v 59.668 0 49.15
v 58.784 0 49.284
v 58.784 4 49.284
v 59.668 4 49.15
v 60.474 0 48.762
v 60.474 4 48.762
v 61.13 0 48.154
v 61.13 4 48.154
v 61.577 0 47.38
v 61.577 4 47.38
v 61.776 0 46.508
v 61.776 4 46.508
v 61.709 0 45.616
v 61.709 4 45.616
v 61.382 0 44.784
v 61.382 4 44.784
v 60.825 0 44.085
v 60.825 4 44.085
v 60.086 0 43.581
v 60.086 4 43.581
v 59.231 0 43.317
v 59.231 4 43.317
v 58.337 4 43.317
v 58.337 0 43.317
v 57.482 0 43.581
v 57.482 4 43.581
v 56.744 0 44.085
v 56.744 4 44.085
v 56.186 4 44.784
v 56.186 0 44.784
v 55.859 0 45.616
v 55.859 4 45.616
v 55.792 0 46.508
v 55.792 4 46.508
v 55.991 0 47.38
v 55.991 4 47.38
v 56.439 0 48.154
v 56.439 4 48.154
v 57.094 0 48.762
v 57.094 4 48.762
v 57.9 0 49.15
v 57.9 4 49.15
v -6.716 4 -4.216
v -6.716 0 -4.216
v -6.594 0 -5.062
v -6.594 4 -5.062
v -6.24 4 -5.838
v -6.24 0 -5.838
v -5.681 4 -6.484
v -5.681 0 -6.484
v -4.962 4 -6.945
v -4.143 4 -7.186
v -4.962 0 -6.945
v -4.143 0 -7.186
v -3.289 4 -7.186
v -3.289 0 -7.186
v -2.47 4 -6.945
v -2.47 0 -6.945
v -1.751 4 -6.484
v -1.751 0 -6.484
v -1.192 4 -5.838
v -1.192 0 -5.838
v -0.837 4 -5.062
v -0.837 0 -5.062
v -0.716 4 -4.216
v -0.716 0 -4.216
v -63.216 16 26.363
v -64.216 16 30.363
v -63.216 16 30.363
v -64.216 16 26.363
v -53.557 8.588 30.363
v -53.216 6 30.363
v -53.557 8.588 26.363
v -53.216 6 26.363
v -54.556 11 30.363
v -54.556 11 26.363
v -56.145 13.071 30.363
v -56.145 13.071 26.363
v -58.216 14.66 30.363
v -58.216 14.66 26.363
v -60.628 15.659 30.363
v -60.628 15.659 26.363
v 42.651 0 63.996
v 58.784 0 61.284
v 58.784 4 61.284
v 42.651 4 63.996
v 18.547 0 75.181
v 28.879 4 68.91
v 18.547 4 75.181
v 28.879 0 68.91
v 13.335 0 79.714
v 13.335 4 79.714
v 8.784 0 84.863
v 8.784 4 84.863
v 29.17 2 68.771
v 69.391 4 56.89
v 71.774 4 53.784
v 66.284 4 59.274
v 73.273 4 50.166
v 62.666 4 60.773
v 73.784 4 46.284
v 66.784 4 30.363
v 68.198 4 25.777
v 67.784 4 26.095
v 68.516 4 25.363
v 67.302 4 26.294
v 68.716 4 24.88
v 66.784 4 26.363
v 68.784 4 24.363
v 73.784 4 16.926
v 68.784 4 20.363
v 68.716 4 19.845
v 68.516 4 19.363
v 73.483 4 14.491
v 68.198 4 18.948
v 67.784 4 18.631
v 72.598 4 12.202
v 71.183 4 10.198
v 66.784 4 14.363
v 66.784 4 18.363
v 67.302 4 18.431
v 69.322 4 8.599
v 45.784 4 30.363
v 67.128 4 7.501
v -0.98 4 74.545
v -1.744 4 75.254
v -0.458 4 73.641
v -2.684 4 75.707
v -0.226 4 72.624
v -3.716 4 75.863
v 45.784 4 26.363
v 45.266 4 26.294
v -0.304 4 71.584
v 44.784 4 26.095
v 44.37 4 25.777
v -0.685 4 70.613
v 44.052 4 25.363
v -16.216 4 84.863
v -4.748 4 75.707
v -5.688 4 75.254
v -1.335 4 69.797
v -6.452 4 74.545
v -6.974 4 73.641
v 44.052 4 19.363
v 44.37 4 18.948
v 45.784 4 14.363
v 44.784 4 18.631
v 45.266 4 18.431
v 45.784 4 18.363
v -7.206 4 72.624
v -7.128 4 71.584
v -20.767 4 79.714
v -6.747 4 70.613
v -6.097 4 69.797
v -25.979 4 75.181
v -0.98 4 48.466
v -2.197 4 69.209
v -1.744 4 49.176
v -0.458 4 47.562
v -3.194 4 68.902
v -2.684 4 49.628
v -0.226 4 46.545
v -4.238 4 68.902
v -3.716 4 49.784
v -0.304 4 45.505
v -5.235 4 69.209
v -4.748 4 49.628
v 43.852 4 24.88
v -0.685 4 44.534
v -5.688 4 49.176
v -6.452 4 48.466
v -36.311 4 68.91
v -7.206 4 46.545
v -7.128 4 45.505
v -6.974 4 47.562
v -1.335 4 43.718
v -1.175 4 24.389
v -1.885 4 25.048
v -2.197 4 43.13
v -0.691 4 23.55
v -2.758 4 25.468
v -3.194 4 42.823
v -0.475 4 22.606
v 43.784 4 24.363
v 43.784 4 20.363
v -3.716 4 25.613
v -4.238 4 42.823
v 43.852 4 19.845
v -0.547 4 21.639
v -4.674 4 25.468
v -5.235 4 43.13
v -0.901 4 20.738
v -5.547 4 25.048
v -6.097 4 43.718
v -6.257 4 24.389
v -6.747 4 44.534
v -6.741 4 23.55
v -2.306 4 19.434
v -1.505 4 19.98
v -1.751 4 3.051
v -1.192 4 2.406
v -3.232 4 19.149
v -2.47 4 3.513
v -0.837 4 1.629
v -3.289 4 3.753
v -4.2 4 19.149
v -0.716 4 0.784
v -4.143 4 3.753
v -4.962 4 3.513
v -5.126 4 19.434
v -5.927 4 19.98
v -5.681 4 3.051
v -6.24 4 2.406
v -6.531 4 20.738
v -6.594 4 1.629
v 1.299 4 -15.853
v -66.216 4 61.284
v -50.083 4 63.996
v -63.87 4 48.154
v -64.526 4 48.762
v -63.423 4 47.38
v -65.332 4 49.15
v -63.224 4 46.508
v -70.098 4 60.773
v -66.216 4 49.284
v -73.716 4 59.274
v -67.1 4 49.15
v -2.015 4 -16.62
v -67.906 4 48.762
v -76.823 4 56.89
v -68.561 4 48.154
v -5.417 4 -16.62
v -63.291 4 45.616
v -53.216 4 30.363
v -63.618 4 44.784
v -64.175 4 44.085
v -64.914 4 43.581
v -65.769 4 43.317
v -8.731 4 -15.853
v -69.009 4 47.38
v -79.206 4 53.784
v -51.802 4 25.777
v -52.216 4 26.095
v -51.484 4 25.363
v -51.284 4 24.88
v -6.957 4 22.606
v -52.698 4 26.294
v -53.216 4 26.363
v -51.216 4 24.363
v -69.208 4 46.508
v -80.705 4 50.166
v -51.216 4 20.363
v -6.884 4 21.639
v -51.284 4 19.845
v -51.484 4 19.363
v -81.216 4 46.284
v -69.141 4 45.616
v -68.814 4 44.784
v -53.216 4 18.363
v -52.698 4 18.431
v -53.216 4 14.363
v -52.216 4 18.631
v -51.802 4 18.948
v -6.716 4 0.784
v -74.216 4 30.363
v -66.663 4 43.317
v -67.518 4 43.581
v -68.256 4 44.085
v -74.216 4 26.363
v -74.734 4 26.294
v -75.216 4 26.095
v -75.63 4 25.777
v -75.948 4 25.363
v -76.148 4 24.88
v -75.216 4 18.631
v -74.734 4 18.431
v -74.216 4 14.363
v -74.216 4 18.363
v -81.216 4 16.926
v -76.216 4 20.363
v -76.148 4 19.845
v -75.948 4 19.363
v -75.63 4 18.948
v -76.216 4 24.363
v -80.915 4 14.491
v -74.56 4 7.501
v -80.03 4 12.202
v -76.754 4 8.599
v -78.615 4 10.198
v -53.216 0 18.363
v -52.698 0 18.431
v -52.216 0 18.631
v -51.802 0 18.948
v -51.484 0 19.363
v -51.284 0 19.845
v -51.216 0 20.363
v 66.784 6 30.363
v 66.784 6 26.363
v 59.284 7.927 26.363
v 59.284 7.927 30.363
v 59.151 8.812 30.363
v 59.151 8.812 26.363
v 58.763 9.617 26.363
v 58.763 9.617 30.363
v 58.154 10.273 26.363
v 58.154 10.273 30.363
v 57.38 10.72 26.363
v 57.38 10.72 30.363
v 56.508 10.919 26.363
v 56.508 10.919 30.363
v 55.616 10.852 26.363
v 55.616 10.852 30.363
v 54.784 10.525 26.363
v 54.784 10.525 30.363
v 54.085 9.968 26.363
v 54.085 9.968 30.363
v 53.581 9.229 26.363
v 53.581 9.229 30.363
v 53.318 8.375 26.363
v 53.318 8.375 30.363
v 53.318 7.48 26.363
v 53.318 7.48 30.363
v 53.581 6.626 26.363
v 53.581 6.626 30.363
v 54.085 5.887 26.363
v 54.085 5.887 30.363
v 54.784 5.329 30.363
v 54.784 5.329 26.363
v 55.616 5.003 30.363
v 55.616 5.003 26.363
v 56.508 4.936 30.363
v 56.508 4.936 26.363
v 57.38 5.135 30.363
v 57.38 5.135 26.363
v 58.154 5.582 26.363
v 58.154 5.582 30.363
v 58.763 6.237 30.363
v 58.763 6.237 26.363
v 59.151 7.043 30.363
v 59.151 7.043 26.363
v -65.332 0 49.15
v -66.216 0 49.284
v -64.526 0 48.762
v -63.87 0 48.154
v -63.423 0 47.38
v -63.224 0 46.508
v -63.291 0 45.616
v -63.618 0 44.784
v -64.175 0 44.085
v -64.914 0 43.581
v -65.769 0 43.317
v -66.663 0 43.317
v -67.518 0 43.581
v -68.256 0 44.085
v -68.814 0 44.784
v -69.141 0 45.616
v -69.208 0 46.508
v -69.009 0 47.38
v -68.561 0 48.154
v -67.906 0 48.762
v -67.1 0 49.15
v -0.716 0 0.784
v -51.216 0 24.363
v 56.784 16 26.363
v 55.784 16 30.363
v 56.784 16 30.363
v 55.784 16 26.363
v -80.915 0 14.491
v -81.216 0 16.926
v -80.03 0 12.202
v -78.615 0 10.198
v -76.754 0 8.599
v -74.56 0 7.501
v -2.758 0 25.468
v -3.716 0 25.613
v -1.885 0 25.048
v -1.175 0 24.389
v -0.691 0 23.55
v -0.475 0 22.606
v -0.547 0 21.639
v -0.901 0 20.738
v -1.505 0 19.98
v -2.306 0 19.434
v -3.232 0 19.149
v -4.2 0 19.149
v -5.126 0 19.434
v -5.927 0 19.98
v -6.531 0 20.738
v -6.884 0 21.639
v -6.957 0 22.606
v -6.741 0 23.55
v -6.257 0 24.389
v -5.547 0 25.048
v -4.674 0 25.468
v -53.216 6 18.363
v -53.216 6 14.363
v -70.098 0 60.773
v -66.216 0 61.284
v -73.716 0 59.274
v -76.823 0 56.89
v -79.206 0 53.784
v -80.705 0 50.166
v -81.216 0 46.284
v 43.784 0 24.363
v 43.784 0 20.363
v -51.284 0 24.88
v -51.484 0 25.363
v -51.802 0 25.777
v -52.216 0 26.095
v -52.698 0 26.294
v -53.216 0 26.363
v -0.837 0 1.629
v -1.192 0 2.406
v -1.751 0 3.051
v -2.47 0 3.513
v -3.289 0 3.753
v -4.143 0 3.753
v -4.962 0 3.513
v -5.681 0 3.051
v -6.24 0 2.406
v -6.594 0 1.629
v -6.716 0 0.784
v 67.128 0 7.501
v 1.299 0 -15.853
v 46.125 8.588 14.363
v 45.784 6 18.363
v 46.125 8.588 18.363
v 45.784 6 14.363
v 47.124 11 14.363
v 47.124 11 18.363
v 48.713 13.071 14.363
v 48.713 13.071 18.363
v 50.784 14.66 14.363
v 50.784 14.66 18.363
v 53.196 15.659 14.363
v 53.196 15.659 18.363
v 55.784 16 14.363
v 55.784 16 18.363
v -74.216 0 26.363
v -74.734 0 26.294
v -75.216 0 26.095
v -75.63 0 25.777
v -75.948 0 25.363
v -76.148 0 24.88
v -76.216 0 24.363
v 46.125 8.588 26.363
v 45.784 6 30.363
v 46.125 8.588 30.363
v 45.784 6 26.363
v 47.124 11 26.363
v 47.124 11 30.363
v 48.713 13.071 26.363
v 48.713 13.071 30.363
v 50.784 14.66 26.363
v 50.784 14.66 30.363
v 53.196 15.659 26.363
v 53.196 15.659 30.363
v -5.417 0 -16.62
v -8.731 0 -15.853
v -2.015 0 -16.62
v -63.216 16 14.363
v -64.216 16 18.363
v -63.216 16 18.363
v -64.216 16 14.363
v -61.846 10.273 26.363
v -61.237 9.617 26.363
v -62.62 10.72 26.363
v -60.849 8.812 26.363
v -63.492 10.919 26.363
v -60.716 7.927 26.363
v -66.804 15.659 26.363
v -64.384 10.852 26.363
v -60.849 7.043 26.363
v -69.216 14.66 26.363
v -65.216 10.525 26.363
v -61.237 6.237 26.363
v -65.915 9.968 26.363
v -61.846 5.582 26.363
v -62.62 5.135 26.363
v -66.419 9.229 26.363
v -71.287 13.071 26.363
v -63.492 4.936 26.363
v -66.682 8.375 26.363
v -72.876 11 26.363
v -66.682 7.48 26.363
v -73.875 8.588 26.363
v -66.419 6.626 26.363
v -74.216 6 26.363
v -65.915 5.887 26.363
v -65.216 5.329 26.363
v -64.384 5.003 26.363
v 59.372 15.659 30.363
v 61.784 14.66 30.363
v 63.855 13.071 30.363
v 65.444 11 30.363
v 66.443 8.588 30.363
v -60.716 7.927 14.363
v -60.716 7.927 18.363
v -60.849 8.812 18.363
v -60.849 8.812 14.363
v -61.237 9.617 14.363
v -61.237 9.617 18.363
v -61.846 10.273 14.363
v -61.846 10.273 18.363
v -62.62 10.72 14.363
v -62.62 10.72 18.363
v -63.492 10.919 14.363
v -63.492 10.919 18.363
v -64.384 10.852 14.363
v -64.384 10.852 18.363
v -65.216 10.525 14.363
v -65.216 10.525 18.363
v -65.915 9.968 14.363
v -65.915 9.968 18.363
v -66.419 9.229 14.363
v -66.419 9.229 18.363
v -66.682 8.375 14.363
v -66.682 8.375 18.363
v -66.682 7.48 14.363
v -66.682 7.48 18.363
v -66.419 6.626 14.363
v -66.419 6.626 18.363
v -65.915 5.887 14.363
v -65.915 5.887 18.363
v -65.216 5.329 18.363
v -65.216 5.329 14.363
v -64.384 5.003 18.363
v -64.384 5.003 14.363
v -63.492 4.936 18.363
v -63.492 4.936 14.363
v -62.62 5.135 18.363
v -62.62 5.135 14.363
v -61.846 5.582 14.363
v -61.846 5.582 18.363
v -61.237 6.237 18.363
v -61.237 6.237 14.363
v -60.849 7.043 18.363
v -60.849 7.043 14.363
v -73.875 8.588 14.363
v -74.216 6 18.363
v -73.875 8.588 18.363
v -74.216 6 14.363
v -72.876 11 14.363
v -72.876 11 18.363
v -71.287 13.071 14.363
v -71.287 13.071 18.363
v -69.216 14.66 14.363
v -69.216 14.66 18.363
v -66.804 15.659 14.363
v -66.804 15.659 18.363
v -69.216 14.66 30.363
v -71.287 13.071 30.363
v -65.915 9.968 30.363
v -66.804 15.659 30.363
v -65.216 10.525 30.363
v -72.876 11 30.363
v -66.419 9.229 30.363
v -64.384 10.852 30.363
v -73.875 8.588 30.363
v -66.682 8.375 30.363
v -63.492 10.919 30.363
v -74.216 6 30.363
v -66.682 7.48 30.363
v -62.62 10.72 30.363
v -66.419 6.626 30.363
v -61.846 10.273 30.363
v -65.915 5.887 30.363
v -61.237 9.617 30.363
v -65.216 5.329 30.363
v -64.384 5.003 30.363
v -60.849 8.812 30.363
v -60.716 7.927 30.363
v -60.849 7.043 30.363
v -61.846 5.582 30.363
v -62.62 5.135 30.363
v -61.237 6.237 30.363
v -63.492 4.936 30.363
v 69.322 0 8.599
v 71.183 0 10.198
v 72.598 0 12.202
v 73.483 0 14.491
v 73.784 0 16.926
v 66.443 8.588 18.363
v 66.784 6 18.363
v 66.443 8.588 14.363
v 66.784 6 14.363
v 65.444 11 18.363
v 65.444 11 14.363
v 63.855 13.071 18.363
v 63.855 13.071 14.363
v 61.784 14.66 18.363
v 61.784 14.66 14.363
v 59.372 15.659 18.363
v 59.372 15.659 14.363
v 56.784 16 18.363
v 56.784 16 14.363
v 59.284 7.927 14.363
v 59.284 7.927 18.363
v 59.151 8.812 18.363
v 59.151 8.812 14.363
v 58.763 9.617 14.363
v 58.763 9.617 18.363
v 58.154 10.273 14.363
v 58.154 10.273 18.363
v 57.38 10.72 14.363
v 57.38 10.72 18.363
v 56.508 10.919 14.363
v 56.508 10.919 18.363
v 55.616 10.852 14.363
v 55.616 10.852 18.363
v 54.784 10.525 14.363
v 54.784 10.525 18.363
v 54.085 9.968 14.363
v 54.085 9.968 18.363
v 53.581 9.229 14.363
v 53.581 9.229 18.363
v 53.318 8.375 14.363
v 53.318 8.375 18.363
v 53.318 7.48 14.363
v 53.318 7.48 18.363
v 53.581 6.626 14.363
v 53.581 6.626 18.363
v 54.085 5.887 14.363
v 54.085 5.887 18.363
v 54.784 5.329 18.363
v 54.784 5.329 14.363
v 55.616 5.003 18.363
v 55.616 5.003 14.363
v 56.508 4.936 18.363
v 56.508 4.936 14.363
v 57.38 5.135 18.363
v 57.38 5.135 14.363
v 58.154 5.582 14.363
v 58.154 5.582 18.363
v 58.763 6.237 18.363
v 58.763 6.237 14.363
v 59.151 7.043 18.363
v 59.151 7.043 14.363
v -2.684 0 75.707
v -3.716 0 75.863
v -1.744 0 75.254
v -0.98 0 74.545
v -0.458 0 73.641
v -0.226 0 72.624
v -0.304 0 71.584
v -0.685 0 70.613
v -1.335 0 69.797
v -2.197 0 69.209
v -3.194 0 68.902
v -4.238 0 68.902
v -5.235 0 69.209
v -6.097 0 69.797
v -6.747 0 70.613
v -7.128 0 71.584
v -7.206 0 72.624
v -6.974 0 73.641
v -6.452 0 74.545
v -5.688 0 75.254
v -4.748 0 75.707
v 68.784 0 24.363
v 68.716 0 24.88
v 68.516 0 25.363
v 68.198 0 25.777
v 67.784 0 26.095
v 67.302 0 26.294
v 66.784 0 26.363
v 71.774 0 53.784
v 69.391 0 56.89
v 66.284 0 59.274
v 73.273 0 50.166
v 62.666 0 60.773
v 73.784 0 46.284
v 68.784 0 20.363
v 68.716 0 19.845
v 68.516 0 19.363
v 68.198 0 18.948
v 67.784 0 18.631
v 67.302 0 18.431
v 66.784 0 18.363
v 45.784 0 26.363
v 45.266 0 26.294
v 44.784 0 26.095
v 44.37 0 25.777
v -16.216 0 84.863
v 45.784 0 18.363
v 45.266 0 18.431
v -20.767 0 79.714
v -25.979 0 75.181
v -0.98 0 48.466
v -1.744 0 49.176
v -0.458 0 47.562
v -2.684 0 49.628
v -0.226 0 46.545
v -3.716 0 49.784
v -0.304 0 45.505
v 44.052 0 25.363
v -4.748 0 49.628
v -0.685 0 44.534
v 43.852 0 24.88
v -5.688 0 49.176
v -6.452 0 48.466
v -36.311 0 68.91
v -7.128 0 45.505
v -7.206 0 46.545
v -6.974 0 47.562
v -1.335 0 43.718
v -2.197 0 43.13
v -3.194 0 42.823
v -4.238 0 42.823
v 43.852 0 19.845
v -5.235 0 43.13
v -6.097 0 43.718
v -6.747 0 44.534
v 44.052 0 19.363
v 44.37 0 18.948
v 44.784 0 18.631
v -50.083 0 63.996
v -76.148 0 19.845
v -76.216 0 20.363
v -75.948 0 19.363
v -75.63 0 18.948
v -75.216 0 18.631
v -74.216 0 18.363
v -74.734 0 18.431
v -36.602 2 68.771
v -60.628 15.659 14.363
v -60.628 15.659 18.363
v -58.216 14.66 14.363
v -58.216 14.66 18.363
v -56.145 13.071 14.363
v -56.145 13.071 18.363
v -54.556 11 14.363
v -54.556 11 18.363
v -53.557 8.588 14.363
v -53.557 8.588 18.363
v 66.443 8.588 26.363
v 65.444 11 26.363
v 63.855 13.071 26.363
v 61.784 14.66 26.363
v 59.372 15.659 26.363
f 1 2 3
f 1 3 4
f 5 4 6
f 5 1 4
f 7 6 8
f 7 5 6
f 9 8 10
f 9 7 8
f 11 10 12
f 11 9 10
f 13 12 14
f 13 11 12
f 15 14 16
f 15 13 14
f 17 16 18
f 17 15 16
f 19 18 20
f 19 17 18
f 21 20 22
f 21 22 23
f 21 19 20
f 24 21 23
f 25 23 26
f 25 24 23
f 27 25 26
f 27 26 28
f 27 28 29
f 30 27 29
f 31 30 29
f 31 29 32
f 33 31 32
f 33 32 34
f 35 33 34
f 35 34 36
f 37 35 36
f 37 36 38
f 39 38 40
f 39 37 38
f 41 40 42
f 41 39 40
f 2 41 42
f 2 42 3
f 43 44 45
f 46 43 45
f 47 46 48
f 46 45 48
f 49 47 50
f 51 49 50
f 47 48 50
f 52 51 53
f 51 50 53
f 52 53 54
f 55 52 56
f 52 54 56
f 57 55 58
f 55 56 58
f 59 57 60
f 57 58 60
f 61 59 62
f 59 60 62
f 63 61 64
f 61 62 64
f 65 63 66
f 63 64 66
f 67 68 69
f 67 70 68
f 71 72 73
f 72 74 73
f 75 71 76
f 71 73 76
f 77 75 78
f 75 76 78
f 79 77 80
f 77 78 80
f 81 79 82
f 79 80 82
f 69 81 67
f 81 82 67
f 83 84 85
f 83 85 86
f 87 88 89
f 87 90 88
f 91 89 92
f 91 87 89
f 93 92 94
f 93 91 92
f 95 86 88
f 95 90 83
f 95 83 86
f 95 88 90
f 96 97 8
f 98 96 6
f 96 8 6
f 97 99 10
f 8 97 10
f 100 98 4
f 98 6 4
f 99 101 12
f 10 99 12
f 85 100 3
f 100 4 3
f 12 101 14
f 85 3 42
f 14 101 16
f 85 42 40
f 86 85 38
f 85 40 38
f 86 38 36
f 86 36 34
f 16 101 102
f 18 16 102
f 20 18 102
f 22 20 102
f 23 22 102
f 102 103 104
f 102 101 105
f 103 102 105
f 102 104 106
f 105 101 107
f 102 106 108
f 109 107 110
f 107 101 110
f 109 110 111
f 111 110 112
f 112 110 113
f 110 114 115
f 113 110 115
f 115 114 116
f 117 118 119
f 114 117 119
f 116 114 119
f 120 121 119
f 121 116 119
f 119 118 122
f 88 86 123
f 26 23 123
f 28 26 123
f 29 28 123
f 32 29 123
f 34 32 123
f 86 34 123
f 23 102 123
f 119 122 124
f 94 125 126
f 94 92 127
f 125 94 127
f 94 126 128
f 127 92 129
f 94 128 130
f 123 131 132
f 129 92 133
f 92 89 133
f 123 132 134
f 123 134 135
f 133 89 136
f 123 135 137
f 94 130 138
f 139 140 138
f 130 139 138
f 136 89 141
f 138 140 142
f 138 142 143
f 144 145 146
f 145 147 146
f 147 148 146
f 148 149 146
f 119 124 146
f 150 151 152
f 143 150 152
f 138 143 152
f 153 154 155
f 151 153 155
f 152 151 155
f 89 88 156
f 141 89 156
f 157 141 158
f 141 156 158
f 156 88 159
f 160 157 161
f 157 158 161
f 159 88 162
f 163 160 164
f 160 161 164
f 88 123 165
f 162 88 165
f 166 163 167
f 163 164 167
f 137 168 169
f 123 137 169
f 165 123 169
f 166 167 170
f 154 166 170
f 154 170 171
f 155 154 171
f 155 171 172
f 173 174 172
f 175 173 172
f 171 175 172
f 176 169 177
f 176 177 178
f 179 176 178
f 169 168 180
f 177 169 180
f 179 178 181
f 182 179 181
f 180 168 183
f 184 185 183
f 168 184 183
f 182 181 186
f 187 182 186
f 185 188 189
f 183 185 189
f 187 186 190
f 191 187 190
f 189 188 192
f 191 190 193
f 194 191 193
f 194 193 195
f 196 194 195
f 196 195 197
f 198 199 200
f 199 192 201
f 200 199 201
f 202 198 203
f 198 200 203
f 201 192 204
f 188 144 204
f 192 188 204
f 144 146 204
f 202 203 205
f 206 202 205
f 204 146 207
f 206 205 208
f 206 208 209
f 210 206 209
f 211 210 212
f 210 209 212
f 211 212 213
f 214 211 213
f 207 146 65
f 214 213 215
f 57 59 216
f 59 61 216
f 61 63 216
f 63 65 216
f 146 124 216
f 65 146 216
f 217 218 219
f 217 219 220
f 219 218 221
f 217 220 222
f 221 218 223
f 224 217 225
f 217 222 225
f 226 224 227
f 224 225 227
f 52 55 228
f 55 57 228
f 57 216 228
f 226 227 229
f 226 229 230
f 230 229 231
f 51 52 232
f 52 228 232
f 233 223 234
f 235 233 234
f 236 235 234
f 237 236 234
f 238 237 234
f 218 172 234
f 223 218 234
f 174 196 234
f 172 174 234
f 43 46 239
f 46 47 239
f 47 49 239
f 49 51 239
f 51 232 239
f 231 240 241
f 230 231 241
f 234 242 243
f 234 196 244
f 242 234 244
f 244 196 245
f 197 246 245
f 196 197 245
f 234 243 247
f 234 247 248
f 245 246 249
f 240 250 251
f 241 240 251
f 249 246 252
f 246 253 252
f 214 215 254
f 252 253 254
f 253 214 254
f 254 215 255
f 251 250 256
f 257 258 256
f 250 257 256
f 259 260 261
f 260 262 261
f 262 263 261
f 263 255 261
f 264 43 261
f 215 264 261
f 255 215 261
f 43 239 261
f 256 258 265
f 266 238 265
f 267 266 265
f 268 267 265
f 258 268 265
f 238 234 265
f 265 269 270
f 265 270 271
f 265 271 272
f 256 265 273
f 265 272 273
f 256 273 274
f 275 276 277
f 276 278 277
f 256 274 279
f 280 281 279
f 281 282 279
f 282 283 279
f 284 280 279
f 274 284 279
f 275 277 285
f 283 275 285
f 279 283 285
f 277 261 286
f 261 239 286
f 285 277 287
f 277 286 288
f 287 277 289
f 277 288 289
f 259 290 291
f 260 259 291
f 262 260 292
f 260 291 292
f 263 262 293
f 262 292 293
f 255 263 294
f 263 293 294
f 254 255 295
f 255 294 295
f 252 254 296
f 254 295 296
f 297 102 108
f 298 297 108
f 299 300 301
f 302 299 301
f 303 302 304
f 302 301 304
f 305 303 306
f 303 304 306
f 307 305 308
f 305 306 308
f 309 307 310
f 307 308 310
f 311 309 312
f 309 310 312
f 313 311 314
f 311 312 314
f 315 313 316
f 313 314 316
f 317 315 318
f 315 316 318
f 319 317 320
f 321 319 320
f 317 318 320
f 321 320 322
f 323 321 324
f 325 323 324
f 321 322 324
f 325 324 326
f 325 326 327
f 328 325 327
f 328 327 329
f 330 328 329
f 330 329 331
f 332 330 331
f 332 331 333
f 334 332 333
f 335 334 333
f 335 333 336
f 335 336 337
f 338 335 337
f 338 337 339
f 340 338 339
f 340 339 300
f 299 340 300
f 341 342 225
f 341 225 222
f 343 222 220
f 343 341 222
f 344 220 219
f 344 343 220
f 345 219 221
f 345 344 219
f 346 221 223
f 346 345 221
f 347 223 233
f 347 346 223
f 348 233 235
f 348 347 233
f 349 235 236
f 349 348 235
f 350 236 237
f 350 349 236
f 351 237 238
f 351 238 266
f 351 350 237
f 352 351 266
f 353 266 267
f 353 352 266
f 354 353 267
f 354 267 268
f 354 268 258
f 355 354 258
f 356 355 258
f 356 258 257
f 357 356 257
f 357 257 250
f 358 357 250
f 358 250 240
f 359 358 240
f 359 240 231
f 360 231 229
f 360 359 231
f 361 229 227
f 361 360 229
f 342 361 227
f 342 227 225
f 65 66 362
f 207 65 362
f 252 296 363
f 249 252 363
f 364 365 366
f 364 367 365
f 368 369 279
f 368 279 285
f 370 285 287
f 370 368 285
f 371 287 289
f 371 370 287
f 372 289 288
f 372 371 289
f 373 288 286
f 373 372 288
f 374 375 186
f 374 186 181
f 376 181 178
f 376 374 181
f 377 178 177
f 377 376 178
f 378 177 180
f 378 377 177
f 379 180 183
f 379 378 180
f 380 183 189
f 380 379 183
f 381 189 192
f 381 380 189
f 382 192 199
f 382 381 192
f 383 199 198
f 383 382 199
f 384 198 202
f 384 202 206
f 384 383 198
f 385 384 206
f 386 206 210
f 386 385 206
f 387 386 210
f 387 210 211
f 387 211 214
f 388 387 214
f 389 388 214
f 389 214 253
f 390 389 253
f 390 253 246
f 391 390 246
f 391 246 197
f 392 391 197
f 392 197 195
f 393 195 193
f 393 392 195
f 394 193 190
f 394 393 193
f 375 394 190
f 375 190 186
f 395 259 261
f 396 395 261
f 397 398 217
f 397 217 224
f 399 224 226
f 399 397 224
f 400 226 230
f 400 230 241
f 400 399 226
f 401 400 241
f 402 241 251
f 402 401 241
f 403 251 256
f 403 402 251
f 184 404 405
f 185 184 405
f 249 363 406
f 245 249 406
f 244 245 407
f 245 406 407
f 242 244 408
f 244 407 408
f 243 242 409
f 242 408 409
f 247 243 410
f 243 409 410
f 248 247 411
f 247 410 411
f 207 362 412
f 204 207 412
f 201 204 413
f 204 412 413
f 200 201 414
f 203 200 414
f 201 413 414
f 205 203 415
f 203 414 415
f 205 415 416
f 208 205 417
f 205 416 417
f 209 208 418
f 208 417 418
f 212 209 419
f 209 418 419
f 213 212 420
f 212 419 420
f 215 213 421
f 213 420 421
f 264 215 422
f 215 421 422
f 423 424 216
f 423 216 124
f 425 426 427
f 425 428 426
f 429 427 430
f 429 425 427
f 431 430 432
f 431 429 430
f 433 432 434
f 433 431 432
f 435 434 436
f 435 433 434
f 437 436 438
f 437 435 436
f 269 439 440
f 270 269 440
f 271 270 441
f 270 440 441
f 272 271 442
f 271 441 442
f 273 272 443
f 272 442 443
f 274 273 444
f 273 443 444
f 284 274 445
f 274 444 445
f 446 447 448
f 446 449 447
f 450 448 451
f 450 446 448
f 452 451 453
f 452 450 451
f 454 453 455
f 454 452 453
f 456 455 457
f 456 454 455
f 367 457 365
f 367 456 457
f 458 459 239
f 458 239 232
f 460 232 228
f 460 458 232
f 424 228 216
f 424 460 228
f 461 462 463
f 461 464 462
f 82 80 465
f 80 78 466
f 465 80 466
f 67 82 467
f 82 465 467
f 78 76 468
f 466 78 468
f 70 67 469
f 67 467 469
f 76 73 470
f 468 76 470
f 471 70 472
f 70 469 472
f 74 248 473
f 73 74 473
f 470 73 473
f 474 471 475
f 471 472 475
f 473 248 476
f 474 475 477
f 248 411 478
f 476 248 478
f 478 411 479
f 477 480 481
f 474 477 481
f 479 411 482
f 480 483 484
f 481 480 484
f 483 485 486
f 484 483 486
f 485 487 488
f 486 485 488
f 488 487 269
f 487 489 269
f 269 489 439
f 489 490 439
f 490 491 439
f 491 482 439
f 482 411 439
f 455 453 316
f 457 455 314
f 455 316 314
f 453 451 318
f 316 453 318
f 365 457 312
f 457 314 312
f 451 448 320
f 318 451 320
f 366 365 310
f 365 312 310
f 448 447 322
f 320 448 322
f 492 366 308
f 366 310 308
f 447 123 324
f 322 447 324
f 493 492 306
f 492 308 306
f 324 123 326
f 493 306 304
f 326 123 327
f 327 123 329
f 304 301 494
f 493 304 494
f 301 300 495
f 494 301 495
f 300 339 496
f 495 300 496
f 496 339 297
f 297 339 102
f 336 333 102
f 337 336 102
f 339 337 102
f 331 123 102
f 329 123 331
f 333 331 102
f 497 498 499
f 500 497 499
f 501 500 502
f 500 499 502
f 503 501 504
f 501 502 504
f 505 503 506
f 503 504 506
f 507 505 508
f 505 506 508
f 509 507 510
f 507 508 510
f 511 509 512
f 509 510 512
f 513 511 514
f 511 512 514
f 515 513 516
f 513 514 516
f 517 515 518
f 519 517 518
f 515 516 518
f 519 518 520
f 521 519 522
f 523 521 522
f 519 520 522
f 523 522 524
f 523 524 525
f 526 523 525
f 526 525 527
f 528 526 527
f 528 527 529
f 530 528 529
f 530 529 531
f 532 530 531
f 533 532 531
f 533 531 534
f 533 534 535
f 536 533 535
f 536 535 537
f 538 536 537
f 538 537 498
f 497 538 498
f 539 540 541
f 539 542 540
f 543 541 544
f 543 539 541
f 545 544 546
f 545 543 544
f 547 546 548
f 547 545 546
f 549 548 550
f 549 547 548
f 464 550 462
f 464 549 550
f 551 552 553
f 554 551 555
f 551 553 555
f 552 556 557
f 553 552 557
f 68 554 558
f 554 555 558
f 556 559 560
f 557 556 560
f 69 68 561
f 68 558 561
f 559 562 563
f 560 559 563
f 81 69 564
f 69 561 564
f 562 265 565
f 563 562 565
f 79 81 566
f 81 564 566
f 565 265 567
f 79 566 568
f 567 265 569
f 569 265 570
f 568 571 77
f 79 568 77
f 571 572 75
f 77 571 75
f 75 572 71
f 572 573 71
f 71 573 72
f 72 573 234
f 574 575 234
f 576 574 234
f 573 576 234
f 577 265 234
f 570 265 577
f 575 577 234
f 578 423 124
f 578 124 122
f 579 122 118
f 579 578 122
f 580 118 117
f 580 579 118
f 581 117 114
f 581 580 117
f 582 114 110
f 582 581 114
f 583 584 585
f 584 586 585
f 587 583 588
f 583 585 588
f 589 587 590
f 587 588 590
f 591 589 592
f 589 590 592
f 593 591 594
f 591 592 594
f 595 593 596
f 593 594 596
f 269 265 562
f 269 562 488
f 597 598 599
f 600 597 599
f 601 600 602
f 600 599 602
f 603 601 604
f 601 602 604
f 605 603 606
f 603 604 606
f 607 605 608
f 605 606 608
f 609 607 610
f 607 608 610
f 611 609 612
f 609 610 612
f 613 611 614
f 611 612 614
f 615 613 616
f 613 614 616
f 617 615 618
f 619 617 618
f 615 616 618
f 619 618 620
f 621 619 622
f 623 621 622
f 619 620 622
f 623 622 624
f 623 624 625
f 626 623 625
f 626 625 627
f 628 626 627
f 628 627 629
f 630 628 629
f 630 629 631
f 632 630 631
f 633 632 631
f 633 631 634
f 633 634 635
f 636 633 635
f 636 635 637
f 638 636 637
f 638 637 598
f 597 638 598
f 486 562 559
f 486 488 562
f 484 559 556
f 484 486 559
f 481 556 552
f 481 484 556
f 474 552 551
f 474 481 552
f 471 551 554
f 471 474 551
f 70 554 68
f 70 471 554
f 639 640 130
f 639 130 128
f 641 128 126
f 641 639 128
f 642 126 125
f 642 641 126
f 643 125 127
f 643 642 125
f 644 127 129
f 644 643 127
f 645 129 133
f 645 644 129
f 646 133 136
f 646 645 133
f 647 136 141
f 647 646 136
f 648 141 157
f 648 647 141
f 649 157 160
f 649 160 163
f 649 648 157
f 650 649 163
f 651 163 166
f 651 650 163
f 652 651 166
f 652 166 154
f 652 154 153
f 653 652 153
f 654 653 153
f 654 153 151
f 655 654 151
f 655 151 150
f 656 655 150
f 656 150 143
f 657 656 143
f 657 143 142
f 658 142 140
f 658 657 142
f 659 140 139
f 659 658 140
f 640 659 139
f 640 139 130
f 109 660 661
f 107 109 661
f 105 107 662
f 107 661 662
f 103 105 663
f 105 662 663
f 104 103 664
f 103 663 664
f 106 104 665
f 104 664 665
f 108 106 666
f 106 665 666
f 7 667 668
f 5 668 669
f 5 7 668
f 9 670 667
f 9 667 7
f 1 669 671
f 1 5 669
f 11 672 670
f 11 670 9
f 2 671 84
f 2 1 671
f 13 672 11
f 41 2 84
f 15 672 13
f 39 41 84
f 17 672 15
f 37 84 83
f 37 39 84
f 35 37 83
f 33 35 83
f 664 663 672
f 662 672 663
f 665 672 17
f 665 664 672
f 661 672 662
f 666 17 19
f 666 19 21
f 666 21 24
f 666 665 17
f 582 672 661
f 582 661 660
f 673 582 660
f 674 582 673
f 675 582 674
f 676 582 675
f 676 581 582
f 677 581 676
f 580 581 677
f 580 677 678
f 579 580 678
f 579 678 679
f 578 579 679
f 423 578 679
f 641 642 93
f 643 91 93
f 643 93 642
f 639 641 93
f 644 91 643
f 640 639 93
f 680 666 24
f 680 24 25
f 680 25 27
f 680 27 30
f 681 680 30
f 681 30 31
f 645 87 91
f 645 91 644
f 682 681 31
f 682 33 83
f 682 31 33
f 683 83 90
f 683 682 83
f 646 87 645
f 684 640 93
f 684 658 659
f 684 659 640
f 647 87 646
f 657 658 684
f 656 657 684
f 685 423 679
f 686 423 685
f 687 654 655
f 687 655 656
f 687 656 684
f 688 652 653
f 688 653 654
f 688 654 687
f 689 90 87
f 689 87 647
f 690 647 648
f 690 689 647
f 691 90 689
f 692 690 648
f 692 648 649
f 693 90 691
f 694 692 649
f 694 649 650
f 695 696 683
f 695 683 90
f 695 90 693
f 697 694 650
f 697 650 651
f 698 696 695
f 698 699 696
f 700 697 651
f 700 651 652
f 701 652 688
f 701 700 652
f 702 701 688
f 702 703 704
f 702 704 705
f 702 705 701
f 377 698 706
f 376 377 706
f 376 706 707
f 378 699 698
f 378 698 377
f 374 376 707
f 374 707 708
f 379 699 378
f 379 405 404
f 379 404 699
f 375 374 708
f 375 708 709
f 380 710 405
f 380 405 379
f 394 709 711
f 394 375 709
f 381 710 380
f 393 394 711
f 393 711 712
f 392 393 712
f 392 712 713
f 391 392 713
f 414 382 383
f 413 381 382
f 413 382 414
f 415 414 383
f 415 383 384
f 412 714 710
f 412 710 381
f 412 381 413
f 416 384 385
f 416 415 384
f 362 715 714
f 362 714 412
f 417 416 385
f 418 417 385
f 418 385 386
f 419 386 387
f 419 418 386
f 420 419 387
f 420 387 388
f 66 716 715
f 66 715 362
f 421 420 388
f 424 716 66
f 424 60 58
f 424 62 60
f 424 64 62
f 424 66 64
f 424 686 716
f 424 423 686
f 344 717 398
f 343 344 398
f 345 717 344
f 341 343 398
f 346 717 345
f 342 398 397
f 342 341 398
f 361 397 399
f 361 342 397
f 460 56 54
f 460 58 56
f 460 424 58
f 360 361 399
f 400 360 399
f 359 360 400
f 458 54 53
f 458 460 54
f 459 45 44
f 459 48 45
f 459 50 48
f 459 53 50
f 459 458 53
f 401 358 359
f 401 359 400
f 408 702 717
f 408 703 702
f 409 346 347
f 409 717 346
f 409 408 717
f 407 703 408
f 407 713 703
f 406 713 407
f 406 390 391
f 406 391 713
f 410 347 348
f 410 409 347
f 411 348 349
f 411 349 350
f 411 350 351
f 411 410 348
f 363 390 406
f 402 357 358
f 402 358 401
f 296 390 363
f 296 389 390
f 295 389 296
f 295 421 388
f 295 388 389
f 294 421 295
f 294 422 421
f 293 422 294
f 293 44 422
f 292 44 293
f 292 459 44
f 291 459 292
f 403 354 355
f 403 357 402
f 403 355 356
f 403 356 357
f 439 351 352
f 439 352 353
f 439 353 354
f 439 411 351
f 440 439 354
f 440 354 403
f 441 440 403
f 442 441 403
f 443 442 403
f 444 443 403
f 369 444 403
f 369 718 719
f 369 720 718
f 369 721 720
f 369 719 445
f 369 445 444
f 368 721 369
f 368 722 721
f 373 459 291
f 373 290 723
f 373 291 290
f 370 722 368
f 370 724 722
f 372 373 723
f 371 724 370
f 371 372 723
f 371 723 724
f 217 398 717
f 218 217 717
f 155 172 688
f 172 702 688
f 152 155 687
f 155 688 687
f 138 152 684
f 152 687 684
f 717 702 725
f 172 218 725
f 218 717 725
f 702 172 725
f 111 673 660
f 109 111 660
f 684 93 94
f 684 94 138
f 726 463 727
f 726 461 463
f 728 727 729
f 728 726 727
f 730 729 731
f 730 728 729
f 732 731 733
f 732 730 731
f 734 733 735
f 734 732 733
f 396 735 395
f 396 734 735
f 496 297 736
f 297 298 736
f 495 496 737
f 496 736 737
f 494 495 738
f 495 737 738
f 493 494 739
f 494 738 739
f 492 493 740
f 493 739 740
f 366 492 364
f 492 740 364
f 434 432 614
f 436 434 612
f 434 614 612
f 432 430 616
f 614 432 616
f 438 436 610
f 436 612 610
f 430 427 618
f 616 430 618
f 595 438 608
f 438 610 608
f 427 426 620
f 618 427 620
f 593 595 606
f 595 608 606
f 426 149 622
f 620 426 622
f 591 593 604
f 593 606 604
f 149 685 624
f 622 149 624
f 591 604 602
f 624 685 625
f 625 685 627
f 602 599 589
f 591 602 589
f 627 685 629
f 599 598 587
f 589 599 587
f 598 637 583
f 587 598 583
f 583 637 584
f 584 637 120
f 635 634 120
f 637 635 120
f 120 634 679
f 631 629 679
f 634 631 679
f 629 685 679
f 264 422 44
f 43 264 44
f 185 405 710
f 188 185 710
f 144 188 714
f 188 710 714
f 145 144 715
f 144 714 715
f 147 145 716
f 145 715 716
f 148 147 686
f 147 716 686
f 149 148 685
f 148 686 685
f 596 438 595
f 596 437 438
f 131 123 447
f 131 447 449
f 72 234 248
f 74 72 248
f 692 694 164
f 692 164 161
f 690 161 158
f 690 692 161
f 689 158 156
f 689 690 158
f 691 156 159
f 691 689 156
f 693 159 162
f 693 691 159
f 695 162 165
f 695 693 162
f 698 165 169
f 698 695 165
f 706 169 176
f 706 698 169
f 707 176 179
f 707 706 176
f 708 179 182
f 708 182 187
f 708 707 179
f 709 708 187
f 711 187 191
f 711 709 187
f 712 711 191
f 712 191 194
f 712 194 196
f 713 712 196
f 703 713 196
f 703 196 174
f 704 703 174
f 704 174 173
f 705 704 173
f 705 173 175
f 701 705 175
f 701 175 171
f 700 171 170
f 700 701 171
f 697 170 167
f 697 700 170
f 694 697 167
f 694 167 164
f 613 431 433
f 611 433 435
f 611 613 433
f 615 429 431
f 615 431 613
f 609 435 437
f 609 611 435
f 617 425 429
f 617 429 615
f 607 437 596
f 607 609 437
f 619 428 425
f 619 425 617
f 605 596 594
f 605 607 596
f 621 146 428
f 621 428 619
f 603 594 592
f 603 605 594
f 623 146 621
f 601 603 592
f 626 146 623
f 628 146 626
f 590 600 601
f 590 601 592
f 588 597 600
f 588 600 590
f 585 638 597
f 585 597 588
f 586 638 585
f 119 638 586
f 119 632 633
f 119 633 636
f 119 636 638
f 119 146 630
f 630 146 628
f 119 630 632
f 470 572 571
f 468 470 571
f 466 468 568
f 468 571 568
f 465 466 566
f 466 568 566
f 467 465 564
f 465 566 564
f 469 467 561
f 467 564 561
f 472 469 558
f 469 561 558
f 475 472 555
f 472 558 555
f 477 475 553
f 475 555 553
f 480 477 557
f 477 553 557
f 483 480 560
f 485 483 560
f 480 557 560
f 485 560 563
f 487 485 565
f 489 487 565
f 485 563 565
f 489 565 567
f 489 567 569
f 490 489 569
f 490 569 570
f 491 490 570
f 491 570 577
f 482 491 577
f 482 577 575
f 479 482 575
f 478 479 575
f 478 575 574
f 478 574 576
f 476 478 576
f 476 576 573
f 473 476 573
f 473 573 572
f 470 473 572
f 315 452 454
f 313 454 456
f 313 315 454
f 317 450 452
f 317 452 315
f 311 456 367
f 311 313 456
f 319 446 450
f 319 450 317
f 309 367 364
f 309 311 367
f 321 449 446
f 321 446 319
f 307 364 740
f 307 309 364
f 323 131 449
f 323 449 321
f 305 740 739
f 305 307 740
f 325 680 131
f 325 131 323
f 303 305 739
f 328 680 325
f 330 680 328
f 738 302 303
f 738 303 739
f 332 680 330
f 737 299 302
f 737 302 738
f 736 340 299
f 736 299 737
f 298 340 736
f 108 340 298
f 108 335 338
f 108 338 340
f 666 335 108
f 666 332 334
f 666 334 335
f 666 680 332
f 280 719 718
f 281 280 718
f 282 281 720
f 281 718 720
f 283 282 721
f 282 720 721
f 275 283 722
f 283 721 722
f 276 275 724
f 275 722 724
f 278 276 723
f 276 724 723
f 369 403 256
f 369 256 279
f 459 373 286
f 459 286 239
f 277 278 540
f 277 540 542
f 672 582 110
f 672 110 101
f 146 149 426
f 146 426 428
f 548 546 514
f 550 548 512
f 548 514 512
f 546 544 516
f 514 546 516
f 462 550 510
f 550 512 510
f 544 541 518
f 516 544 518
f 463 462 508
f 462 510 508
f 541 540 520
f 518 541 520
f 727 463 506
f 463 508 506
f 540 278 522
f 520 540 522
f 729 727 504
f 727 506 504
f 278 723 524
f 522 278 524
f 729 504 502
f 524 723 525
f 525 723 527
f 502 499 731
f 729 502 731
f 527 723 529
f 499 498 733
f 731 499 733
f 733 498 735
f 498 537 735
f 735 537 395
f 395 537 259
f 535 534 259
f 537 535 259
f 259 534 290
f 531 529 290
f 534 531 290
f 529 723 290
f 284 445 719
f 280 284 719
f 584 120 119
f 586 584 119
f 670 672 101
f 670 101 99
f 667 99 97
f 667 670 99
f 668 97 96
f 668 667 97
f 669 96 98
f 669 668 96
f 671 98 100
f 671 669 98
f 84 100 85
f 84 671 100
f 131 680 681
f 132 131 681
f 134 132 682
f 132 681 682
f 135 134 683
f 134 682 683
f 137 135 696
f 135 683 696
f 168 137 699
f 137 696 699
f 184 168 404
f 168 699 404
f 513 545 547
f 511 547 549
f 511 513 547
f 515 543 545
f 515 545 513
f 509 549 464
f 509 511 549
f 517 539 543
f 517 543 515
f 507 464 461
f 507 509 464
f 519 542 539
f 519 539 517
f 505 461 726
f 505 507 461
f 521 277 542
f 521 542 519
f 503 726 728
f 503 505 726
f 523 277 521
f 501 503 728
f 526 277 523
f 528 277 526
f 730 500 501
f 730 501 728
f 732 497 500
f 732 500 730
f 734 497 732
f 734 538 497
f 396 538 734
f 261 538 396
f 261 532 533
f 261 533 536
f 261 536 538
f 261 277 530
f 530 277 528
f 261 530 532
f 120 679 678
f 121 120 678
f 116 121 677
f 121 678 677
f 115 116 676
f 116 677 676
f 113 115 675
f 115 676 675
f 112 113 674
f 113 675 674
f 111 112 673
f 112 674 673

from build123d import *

# Parameters (mm, degrees)
SKETCH2_R              = 3
SKETCH2_R_2            = 3.25
SKETCH2_R_3            = 3.5
MAINPLATEEXTRUDE_DEPTH = 4
SKETCH3_W              = 21
SKETCH3_H              = 4
TOPBEARING_DEPTH       = 12
FILLET1_R              = 10
TOPBEARINGCUT_REACH    = 101.107
SKETCH4_R              = 3


with BuildPart() as part:
    # Sketch2 → MainPlateExtrude (new body)
    with BuildSketch(Plane(origin=(0, 0, 0), x_dir=(1, 0, 0), z_dir=(0, 1, 0))):
        with BuildLine():
            Line((-81.215970545, -46.28367362), (-81.215970545, -16.925572983))
            ThreePointArc((-81.215970545, -16.925572983), (-79.384065752, -11.156498475), (-74.559526408, -7.501103014))
            Line((-74.559526408, -7.501103014), (-8.731304339, 15.853031333))
            ThreePointArc((-8.731304339, 15.853031333), (-3.715970545, 16.71632638), (1.299363248, 15.853031333))
            Line((1.299363248, 15.853031333), (67.127585317, -7.501103014))
            ThreePointArc((67.127585317, -7.501103014), (71.952124662, -11.156498475), (73.784029455, -16.925572983))
            Line((73.784029455, -16.925572983), (73.784029455, -46.28367362))
            ThreePointArc((73.784029455, -46.28367362), (69.390631173, -56.890275338), (58.784029455, -61.28367362))
            add(Edge.make_bspline(
                [(58.784029455, -61.28367362), (24.556467528, -64.469839896), (8.784029455, -84.862635588)],
                knots=[0, 0, 0, 0.615675344, 0.615675344, 0.615675344], degree=2))
            Line((8.784029455, -84.862635588), (-16.215970545, -84.862635588))
            add(Edge.make_bspline(
                [(-66.215970545, -61.28367362), (-31.988408619, -64.469839896), (-16.215970545, -84.862635588)],
                knots=[0, 0, 0, 0.615675344, 0.615675344, 0.615675344], degree=2))
            ThreePointArc((-66.215970545, -61.28367362), (-76.822572263, -56.890275338), (-81.215970545, -46.28367362))
        make_face()
        with Locations(Location((-66.215970545, -46.28367362, 0), (0, 0, 270))):
            Circle(SKETCH2_R, mode=Mode.SUBTRACT)
        with Locations(Location((58.784029455, -46.28367362, 0), (0, 0, 270))):
            Circle(SKETCH2_R, mode=Mode.SUBTRACT)
        with Locations(Location((-3.715970545, -22.362635588, 0), (0, 0, 270))):
            Circle(SKETCH2_R_2, mode=Mode.SUBTRACT)
        with Locations(Location((-3.715970545, -46.28367362, 0), (0, 0, 270))):
            Circle(SKETCH2_R_3, mode=Mode.SUBTRACT)
        with Locations(Location((-3.715970545, -72.362635588, 0), (0, 0, 270))):
            Circle(SKETCH2_R_3, mode=Mode.SUBTRACT)
        with BuildLine():
            Line((-74.215970545, -18.362635588), (-53.215970545, -18.362635588))
            ThreePointArc((-53.215970545, -18.362635588), (-51.801756983, -18.948422026), (-51.215970545, -20.362635588))
            Line((-51.215970545, -20.362635588), (-51.215970545, -24.362635588))
            ThreePointArc((-51.215970545, -24.362635588), (-51.801756983, -25.77684915), (-53.215970545, -26.362635588))
            Line((-53.215970545, -26.362635588), (-74.215970545, -26.362635588))
            ThreePointArc((-74.215970545, -26.362635588), (-75.630184108, -25.77684915), (-76.215970545, -24.362635588))
            Line((-76.215970545, -24.362635588), (-76.215970545, -20.362635588))
            ThreePointArc((-76.215970545, -20.362635588), (-75.630184108, -18.948422026), (-74.215970545, -18.362635588))
        make_face(mode=Mode.SUBTRACT)
        with BuildLine():
            Line((66.784029455, -26.362635588), (45.784029455, -26.362635588))
            ThreePointArc((45.784029455, -26.362635588), (44.369815892, -25.77684915), (43.784029455, -24.362635588))
            Line((43.784029455, -24.362635588), (43.784029455, -20.362635588))
            ThreePointArc((43.784029455, -20.362635588), (44.369815892, -18.948422026), (45.784029455, -18.362635588))
            Line((45.784029455, -18.362635588), (66.784029455, -18.362635588))
            ThreePointArc((66.784029455, -18.362635588), (68.198243017, -18.948422026), (68.784029455, -20.362635588))
            Line((68.784029455, -20.362635588), (68.784029455, -24.362635588))
            ThreePointArc((68.784029455, -24.362635588), (68.198243017, -25.77684915), (66.784029455, -26.362635588))
        make_face(mode=Mode.SUBTRACT)
        with BuildLine():
            Line((-0.715970545, 4.21632638), (-0.715970545, -0.78367362))
            ThreePointArc((-0.715970545, -0.78367362), (-3.715970545, -3.78367362), (-6.715970545, -0.78367362))
            Line((-6.715970545, -0.78367362), (-6.715970545, 4.21632638))
            ThreePointArc((-6.715970545, 4.21632638), (-3.715970545, 7.21632638), (-0.715970545, 4.21632638))
        make_face(mode=Mode.SUBTRACT)
    extrude(amount=MAINPLATEEXTRUDE_DEPTH)

    # Sketch3 → TopBearing (add)
    with BuildSketch(Plane(origin=(0, 4, 0), x_dir=(1, 0, 0), z_dir=(0, 1, 0))):
        with Locations((-63.715970545, -16.362635588)):
            Rectangle(SKETCH3_W, SKETCH3_H)
        with Locations((-63.715970545, -28.362635588)):
            Rectangle(SKETCH3_W, SKETCH3_H)
        with Locations((56.284029455, -28.362635588)):
            Rectangle(SKETCH3_W, SKETCH3_H)
        with Locations((56.284029455, -16.362635588)):
            Rectangle(SKETCH3_W, SKETCH3_H)
    extrude(amount=TOPBEARING_DEPTH)

    # Fillet1
    fillet1_edges = [part.edges().sort_by_distance(p)[0] for p in [
        (-74.215970545, 16, 16.362635588),
        (-53.215970545, 16, 16.362635588),
        (-74.215970545, 16, 28.362635588),
        (-53.215970545, 16, 28.362635588),
        (45.784029455, 16, 28.362635588),
        (66.784029455, 16, 28.362635588),
        (66.784029455, 16, 16.362635588),
        (45.784029455, 16, 16.362635588),
    ]]
    fillet(fillet1_edges, radius=FILLET1_R)

    # TopBearingCut: up to this face of the body (flat: up to its plane)
    topbearingcut_end = Plane(part.part.faces().sort_by_distance((-63.715970545, 9.226840692, 14.362635588))[0])
    # Sketch4 → TopBearingCut (cut, up to the picked face)
    with BuildSketch(Plane.XY.offset(30.362635588), mode=Mode.PRIVATE) as topbearingcut_sk1:
        with Locations((-63.715970545, 7.927390452)):
            Circle(SKETCH4_R)
    topbearingcut_tool1 = split(extrude(topbearingcut_sk1.sketch, amount=-TOPBEARINGCUT_REACH, mode=Mode.PRIVATE), bisect_by=topbearingcut_end, keep=Keep.BOTH, mode=Mode.PRIVATE)
    # Sketch4 → TopBearingCut (cut, up to the picked face)
    with BuildSketch(Plane.XY.offset(30.362635588), mode=Mode.PRIVATE) as topbearingcut_sk2:
        with Locations((56.284029455, 7.927390452)):
            Circle(SKETCH4_R)
    topbearingcut_tool2 = split(extrude(topbearingcut_sk2.sketch, amount=-TOPBEARINGCUT_REACH, mode=Mode.PRIVATE), bisect_by=topbearingcut_end, keep=Keep.BOTH, mode=Mode.PRIVATE)
    add(topbearingcut_tool1.solids().sort_by(Axis((-63.715971, 7.92739, 30.362636), (0, 0, -1)))[0], mode=Mode.SUBTRACT)
    add(topbearingcut_tool2.solids().sort_by(Axis((56.284029, 7.92739, 30.362636), (0, 0, -1)))[0], mode=Mode.SUBTRACT)


solid = part.part
